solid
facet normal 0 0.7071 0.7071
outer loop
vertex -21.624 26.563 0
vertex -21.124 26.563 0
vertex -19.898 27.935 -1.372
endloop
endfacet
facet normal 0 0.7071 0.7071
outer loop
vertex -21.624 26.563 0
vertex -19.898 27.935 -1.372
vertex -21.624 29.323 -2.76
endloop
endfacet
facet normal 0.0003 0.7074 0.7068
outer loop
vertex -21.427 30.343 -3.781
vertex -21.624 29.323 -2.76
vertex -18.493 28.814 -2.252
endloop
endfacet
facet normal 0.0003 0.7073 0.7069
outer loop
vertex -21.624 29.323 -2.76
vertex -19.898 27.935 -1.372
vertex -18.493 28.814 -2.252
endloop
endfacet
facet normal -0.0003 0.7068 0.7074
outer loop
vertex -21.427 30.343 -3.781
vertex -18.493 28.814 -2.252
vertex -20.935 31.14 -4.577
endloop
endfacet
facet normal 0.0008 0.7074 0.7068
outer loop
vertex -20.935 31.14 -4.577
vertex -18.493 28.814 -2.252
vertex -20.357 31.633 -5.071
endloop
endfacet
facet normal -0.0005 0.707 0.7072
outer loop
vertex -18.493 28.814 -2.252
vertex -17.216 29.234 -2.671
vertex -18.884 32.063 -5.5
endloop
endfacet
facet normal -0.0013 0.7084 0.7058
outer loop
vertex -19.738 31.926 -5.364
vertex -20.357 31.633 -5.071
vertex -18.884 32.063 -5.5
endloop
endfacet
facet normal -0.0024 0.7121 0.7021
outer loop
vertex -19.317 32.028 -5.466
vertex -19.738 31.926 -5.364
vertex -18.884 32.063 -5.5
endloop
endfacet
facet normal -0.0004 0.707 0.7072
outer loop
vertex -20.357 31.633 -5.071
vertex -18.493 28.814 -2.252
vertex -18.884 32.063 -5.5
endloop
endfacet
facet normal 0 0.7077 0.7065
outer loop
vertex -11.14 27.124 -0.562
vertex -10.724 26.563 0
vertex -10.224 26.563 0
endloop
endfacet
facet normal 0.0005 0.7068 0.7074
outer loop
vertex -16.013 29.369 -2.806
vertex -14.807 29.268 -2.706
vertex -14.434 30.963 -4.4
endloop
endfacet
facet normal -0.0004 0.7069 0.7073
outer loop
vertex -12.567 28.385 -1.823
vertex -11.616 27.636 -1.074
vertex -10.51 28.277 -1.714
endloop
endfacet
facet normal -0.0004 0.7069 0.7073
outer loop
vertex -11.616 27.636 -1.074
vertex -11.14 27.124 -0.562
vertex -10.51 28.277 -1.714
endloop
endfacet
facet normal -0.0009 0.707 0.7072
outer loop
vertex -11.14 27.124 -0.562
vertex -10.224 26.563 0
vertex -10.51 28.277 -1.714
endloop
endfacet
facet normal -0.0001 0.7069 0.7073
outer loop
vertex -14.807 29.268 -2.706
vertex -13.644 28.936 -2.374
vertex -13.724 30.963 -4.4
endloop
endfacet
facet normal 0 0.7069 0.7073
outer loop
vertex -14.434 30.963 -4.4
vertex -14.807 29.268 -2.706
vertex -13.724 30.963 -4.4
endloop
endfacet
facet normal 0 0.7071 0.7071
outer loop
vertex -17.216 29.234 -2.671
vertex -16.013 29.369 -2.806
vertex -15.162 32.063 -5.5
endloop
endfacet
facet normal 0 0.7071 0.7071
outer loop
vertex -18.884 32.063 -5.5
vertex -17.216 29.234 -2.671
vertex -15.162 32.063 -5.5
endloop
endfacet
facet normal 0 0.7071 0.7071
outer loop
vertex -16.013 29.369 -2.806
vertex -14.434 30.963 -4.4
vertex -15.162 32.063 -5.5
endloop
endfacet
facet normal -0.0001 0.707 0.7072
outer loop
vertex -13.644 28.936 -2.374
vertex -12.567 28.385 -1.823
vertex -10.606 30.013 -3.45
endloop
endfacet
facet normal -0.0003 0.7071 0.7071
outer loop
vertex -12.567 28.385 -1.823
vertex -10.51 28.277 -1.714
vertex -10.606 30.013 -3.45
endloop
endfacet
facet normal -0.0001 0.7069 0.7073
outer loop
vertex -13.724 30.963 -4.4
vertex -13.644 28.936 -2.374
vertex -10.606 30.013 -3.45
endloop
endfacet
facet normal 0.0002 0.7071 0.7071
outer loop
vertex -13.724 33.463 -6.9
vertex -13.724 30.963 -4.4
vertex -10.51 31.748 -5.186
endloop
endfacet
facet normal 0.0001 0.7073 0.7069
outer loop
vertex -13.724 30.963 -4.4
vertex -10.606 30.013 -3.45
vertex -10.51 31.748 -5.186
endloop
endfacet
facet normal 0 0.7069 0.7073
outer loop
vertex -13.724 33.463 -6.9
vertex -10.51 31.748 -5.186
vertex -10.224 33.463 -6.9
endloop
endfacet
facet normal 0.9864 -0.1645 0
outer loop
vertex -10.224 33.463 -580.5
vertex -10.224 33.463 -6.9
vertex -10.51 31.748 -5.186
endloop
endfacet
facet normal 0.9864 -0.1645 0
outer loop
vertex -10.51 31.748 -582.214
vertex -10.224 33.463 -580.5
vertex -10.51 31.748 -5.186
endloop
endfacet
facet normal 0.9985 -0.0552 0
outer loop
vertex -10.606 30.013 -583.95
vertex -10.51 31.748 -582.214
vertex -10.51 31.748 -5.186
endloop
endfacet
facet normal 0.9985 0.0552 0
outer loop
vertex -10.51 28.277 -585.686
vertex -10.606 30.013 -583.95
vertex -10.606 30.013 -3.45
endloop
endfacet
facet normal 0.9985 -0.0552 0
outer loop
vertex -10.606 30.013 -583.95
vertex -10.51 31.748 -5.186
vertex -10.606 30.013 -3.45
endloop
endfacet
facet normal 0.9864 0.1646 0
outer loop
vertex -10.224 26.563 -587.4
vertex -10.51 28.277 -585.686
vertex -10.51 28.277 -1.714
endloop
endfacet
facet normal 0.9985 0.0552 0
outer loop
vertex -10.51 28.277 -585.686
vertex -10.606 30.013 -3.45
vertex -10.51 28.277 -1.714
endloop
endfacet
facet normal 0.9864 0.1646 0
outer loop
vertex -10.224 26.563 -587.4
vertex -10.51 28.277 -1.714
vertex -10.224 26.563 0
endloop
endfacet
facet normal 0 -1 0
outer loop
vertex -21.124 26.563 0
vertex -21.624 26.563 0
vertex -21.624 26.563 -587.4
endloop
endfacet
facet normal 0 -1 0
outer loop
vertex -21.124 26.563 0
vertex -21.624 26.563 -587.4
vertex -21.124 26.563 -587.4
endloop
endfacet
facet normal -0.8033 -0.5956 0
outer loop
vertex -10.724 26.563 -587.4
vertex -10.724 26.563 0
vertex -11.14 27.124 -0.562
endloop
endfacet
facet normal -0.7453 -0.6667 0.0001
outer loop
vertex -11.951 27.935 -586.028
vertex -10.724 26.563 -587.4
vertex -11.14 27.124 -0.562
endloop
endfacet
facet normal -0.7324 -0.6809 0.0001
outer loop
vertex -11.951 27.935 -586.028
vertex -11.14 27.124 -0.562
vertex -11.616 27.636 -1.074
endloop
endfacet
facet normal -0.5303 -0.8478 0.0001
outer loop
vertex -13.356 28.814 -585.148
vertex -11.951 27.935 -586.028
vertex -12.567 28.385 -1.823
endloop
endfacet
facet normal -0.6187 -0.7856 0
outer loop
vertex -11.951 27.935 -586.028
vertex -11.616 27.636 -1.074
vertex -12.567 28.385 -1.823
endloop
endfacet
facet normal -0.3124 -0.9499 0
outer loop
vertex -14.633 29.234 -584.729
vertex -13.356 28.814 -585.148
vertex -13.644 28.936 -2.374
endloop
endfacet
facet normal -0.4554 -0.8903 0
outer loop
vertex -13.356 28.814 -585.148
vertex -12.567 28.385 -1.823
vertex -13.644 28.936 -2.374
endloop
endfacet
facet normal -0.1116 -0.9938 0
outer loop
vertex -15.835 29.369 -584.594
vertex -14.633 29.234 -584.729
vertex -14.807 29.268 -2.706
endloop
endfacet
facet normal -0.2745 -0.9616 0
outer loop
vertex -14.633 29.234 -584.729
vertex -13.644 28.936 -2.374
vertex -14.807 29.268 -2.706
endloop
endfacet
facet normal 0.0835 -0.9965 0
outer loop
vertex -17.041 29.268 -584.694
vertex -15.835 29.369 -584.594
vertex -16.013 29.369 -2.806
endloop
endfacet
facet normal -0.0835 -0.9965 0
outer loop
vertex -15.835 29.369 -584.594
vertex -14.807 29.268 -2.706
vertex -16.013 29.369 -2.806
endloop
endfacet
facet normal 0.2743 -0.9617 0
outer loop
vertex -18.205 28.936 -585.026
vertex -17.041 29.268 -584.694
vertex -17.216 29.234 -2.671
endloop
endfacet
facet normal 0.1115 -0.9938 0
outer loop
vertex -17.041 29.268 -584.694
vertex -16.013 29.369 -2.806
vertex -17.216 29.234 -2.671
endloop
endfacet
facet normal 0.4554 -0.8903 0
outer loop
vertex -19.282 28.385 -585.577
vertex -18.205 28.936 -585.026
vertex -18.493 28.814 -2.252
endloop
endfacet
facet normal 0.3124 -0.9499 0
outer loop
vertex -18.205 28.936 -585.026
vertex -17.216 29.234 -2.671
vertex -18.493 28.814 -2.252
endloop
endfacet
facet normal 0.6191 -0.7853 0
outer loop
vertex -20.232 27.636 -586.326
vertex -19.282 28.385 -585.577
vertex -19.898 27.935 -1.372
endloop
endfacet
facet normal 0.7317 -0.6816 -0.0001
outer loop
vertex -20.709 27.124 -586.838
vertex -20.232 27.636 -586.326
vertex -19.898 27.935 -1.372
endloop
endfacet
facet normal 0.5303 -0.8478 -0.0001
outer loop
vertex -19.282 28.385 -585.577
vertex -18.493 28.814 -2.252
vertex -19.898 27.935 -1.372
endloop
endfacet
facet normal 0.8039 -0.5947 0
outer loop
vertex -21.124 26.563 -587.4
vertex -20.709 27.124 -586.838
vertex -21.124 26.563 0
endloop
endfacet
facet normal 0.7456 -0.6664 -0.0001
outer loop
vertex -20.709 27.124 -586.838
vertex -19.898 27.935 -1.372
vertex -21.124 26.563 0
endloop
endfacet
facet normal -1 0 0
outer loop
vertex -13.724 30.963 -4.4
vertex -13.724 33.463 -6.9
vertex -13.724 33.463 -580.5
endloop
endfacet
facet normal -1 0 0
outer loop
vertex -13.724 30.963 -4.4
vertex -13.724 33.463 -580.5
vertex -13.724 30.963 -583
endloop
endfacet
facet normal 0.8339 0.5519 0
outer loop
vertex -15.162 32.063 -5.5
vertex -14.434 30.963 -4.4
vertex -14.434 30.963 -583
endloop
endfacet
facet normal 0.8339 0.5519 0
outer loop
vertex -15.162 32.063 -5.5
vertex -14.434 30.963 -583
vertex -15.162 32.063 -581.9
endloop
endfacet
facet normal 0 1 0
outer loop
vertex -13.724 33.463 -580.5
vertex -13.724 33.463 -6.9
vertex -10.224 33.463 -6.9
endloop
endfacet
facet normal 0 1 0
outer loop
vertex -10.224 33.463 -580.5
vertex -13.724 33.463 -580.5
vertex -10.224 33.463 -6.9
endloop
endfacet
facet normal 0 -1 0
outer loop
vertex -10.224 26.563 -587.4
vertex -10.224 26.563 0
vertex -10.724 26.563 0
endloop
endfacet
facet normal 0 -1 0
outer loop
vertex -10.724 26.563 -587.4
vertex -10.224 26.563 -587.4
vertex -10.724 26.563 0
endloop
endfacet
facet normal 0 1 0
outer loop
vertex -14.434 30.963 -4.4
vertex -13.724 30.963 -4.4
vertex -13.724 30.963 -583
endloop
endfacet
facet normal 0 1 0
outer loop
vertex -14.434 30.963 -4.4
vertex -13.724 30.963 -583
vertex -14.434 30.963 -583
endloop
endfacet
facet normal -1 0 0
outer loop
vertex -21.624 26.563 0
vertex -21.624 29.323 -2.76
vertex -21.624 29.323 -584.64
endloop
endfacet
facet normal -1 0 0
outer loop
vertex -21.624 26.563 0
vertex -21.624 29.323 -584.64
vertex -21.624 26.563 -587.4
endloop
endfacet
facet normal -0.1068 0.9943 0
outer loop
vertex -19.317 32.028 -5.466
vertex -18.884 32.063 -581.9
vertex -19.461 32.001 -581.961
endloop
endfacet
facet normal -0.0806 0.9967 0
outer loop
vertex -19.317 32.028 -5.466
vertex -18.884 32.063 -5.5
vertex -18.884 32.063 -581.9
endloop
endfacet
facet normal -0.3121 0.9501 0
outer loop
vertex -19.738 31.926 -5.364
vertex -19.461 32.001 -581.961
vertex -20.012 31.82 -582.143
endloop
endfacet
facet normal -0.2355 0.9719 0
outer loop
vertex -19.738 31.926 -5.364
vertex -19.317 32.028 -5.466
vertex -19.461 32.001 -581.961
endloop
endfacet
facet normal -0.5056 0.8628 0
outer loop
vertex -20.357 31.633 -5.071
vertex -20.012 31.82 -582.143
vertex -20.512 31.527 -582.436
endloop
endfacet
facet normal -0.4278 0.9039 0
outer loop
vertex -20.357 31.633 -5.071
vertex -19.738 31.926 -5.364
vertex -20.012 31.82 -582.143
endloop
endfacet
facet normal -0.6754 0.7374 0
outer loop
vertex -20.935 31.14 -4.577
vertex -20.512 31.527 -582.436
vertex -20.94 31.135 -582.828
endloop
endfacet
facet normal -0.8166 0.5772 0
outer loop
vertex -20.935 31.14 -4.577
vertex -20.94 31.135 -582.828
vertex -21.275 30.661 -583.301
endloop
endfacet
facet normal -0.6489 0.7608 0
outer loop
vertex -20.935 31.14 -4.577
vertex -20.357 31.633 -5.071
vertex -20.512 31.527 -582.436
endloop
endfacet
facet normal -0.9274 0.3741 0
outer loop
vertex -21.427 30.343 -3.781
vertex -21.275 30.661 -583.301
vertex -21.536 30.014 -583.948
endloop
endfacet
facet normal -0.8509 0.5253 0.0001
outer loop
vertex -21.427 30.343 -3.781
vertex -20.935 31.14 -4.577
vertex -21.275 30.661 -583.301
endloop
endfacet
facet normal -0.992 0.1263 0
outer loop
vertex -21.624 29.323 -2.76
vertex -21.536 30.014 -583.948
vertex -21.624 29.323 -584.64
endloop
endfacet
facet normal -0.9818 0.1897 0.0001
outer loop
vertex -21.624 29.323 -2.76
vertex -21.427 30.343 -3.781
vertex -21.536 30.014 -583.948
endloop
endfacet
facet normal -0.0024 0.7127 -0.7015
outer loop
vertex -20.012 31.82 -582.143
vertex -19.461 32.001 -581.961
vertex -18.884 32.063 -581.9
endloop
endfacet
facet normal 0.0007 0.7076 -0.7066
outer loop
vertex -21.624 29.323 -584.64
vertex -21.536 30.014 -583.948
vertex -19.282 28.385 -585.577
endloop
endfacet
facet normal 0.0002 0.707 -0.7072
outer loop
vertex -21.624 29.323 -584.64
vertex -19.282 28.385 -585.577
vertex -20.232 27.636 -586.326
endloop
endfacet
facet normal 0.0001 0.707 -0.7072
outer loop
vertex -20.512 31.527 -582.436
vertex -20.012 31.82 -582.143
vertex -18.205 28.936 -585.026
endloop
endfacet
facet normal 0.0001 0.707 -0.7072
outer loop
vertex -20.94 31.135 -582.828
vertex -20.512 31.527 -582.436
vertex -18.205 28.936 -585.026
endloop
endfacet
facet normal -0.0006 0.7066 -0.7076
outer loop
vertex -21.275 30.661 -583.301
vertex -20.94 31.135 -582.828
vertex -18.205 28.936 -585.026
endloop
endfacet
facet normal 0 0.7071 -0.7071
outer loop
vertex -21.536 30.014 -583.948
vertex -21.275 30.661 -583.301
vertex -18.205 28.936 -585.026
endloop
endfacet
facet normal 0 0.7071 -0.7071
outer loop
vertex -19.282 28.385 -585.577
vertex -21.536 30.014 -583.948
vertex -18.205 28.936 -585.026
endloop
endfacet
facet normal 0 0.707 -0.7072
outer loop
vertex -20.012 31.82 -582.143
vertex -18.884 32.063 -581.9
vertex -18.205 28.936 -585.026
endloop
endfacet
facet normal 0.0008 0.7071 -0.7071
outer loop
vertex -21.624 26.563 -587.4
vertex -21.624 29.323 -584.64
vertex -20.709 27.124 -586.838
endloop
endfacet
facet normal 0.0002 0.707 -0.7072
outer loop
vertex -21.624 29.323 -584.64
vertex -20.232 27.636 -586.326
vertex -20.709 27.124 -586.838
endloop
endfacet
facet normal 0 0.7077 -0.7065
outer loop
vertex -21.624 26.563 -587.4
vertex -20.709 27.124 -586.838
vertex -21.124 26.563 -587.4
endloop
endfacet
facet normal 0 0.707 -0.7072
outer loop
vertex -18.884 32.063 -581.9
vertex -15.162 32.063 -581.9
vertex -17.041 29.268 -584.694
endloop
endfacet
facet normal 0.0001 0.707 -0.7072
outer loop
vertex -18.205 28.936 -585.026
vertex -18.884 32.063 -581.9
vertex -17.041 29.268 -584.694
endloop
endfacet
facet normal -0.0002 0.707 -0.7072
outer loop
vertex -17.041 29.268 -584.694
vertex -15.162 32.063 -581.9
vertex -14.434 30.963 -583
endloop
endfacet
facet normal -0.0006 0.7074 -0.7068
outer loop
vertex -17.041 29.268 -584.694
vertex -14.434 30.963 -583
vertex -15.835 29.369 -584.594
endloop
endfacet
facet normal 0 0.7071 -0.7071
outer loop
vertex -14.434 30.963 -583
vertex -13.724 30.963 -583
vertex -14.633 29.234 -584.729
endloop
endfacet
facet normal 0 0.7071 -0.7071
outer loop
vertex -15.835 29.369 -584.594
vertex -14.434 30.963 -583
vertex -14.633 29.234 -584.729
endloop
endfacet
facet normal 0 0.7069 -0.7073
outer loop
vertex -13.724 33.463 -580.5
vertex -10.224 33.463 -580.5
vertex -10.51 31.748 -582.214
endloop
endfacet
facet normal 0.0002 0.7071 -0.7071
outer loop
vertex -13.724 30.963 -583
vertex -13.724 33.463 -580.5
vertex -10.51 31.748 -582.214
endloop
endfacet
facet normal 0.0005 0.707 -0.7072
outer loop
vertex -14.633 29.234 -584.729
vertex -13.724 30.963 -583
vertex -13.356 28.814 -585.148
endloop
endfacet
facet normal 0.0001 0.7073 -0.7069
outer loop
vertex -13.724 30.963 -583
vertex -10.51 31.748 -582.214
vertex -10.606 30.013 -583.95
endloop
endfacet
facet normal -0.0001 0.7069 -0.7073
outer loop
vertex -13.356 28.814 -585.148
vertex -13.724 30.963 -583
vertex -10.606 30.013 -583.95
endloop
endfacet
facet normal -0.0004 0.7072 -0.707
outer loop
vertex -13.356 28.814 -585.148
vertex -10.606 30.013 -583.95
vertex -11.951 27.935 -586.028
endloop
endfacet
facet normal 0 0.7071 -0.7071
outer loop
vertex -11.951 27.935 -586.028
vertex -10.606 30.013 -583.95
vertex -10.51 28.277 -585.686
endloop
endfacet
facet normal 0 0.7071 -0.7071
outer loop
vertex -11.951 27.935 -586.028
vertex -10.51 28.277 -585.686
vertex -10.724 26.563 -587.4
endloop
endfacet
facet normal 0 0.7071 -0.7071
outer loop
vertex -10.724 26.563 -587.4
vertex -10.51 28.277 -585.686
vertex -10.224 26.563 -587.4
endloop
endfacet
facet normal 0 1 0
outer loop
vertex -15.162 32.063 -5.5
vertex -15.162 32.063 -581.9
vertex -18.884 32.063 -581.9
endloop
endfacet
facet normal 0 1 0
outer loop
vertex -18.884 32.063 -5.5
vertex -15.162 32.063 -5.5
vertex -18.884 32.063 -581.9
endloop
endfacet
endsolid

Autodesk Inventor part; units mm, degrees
ref_plane "YZ Plane" through (0, 0, 0) normal (1, 0, 0) x (0, 1, 0)
ref_plane "XZ Plane" through (0, 0, 0) normal (0, 1, 0) x (-1, 0, 0)
sketch "Boceto3" plane through (0, 0, 0) normal (0, 0, 1) x (1, 0, 0)
  line L0 (-15.1624, 32.0626) -> (-18.8843, 32.0626)
  line L1 (-13.7243, 33.4626) -> (-13.7243, 30.9626)
  line L2 (-13.7243, 30.9626) -> (-14.4343, 30.9626)
  line L3 (-14.4343, 30.9626) -> (-15.1624, 32.0626)
  arc A0 (-18.8843, 32.0626) -> (-21.6243, 29.3226) centre (-18.8843, 29.3226) ccw
  line L4 (-13.7243, 33.4626) -> (-10.2243, 33.4626)
  line L5 (-21.6243, 29.3226) -> (-21.6243, 26.5626)
  arc A1 (-10.2243, 33.4626) -> (-10.2243, 26.5626) centre (5.1794, 30.0126) ccw
  line L6 (-21.6243, 26.5626) -> (-21.1243, 26.5626)
  line L7 (-10.2243, 26.5626) -> (-10.7243, 26.5626)
  arc A2 (-10.7243, 26.5626) -> (-21.1243, 26.5626) centre (-15.9243, 23.1493) ccw
  dimension "d218" = 2.5
  dimension "d219" = 0.71
  dimension "d221" = 33.5
  dimension "d223" = 2.74
  dimension "d281" = 3.5
  dimension "d288" = 2.76
  dimension "d291" = 0.5
  dimension "d292" = 0.5
extrude "Extrusión4" add sketch "Boceto3" against normal blind 587.4
ref_plane "Plano de trabajo2" through (-10.2243, 33.4626, 0) normal (-1, 0, 0) x (0, 0, -1)
ref_plane "Plano de trabajo4" through (0, 0, -293.7) normal (0, 0, 1) x (1, 0, 0)
sketch "Boceto5" plane through (-10.2243, 33.4626, 0) normal (-1, 0, 0) x (0, 0, -1)
  line L0 (0, 0) -> (0, 6.9) projected
  line L1 (0, 6.9) -> (6.9, 0)
  line L2 (0, 0) -> (587.4, 0) projected
  line L3 (6.9, 0) -> (0, 0)
  line L4 (0, 0) -> (0, 6.9)
  point P0 (0, 33.4626)
  dimension "d296" = 45
extrude "Extrusión6" cut sketch "Boceto5" along normal through all
mirror "Simetría3" about plane through (0, 0, -293.7) normal (0, 0, 1) of "Extrusión6"
properties part number "SP40-10 JUNTA INT CRISTAL 587 mm" material "Caucho"
